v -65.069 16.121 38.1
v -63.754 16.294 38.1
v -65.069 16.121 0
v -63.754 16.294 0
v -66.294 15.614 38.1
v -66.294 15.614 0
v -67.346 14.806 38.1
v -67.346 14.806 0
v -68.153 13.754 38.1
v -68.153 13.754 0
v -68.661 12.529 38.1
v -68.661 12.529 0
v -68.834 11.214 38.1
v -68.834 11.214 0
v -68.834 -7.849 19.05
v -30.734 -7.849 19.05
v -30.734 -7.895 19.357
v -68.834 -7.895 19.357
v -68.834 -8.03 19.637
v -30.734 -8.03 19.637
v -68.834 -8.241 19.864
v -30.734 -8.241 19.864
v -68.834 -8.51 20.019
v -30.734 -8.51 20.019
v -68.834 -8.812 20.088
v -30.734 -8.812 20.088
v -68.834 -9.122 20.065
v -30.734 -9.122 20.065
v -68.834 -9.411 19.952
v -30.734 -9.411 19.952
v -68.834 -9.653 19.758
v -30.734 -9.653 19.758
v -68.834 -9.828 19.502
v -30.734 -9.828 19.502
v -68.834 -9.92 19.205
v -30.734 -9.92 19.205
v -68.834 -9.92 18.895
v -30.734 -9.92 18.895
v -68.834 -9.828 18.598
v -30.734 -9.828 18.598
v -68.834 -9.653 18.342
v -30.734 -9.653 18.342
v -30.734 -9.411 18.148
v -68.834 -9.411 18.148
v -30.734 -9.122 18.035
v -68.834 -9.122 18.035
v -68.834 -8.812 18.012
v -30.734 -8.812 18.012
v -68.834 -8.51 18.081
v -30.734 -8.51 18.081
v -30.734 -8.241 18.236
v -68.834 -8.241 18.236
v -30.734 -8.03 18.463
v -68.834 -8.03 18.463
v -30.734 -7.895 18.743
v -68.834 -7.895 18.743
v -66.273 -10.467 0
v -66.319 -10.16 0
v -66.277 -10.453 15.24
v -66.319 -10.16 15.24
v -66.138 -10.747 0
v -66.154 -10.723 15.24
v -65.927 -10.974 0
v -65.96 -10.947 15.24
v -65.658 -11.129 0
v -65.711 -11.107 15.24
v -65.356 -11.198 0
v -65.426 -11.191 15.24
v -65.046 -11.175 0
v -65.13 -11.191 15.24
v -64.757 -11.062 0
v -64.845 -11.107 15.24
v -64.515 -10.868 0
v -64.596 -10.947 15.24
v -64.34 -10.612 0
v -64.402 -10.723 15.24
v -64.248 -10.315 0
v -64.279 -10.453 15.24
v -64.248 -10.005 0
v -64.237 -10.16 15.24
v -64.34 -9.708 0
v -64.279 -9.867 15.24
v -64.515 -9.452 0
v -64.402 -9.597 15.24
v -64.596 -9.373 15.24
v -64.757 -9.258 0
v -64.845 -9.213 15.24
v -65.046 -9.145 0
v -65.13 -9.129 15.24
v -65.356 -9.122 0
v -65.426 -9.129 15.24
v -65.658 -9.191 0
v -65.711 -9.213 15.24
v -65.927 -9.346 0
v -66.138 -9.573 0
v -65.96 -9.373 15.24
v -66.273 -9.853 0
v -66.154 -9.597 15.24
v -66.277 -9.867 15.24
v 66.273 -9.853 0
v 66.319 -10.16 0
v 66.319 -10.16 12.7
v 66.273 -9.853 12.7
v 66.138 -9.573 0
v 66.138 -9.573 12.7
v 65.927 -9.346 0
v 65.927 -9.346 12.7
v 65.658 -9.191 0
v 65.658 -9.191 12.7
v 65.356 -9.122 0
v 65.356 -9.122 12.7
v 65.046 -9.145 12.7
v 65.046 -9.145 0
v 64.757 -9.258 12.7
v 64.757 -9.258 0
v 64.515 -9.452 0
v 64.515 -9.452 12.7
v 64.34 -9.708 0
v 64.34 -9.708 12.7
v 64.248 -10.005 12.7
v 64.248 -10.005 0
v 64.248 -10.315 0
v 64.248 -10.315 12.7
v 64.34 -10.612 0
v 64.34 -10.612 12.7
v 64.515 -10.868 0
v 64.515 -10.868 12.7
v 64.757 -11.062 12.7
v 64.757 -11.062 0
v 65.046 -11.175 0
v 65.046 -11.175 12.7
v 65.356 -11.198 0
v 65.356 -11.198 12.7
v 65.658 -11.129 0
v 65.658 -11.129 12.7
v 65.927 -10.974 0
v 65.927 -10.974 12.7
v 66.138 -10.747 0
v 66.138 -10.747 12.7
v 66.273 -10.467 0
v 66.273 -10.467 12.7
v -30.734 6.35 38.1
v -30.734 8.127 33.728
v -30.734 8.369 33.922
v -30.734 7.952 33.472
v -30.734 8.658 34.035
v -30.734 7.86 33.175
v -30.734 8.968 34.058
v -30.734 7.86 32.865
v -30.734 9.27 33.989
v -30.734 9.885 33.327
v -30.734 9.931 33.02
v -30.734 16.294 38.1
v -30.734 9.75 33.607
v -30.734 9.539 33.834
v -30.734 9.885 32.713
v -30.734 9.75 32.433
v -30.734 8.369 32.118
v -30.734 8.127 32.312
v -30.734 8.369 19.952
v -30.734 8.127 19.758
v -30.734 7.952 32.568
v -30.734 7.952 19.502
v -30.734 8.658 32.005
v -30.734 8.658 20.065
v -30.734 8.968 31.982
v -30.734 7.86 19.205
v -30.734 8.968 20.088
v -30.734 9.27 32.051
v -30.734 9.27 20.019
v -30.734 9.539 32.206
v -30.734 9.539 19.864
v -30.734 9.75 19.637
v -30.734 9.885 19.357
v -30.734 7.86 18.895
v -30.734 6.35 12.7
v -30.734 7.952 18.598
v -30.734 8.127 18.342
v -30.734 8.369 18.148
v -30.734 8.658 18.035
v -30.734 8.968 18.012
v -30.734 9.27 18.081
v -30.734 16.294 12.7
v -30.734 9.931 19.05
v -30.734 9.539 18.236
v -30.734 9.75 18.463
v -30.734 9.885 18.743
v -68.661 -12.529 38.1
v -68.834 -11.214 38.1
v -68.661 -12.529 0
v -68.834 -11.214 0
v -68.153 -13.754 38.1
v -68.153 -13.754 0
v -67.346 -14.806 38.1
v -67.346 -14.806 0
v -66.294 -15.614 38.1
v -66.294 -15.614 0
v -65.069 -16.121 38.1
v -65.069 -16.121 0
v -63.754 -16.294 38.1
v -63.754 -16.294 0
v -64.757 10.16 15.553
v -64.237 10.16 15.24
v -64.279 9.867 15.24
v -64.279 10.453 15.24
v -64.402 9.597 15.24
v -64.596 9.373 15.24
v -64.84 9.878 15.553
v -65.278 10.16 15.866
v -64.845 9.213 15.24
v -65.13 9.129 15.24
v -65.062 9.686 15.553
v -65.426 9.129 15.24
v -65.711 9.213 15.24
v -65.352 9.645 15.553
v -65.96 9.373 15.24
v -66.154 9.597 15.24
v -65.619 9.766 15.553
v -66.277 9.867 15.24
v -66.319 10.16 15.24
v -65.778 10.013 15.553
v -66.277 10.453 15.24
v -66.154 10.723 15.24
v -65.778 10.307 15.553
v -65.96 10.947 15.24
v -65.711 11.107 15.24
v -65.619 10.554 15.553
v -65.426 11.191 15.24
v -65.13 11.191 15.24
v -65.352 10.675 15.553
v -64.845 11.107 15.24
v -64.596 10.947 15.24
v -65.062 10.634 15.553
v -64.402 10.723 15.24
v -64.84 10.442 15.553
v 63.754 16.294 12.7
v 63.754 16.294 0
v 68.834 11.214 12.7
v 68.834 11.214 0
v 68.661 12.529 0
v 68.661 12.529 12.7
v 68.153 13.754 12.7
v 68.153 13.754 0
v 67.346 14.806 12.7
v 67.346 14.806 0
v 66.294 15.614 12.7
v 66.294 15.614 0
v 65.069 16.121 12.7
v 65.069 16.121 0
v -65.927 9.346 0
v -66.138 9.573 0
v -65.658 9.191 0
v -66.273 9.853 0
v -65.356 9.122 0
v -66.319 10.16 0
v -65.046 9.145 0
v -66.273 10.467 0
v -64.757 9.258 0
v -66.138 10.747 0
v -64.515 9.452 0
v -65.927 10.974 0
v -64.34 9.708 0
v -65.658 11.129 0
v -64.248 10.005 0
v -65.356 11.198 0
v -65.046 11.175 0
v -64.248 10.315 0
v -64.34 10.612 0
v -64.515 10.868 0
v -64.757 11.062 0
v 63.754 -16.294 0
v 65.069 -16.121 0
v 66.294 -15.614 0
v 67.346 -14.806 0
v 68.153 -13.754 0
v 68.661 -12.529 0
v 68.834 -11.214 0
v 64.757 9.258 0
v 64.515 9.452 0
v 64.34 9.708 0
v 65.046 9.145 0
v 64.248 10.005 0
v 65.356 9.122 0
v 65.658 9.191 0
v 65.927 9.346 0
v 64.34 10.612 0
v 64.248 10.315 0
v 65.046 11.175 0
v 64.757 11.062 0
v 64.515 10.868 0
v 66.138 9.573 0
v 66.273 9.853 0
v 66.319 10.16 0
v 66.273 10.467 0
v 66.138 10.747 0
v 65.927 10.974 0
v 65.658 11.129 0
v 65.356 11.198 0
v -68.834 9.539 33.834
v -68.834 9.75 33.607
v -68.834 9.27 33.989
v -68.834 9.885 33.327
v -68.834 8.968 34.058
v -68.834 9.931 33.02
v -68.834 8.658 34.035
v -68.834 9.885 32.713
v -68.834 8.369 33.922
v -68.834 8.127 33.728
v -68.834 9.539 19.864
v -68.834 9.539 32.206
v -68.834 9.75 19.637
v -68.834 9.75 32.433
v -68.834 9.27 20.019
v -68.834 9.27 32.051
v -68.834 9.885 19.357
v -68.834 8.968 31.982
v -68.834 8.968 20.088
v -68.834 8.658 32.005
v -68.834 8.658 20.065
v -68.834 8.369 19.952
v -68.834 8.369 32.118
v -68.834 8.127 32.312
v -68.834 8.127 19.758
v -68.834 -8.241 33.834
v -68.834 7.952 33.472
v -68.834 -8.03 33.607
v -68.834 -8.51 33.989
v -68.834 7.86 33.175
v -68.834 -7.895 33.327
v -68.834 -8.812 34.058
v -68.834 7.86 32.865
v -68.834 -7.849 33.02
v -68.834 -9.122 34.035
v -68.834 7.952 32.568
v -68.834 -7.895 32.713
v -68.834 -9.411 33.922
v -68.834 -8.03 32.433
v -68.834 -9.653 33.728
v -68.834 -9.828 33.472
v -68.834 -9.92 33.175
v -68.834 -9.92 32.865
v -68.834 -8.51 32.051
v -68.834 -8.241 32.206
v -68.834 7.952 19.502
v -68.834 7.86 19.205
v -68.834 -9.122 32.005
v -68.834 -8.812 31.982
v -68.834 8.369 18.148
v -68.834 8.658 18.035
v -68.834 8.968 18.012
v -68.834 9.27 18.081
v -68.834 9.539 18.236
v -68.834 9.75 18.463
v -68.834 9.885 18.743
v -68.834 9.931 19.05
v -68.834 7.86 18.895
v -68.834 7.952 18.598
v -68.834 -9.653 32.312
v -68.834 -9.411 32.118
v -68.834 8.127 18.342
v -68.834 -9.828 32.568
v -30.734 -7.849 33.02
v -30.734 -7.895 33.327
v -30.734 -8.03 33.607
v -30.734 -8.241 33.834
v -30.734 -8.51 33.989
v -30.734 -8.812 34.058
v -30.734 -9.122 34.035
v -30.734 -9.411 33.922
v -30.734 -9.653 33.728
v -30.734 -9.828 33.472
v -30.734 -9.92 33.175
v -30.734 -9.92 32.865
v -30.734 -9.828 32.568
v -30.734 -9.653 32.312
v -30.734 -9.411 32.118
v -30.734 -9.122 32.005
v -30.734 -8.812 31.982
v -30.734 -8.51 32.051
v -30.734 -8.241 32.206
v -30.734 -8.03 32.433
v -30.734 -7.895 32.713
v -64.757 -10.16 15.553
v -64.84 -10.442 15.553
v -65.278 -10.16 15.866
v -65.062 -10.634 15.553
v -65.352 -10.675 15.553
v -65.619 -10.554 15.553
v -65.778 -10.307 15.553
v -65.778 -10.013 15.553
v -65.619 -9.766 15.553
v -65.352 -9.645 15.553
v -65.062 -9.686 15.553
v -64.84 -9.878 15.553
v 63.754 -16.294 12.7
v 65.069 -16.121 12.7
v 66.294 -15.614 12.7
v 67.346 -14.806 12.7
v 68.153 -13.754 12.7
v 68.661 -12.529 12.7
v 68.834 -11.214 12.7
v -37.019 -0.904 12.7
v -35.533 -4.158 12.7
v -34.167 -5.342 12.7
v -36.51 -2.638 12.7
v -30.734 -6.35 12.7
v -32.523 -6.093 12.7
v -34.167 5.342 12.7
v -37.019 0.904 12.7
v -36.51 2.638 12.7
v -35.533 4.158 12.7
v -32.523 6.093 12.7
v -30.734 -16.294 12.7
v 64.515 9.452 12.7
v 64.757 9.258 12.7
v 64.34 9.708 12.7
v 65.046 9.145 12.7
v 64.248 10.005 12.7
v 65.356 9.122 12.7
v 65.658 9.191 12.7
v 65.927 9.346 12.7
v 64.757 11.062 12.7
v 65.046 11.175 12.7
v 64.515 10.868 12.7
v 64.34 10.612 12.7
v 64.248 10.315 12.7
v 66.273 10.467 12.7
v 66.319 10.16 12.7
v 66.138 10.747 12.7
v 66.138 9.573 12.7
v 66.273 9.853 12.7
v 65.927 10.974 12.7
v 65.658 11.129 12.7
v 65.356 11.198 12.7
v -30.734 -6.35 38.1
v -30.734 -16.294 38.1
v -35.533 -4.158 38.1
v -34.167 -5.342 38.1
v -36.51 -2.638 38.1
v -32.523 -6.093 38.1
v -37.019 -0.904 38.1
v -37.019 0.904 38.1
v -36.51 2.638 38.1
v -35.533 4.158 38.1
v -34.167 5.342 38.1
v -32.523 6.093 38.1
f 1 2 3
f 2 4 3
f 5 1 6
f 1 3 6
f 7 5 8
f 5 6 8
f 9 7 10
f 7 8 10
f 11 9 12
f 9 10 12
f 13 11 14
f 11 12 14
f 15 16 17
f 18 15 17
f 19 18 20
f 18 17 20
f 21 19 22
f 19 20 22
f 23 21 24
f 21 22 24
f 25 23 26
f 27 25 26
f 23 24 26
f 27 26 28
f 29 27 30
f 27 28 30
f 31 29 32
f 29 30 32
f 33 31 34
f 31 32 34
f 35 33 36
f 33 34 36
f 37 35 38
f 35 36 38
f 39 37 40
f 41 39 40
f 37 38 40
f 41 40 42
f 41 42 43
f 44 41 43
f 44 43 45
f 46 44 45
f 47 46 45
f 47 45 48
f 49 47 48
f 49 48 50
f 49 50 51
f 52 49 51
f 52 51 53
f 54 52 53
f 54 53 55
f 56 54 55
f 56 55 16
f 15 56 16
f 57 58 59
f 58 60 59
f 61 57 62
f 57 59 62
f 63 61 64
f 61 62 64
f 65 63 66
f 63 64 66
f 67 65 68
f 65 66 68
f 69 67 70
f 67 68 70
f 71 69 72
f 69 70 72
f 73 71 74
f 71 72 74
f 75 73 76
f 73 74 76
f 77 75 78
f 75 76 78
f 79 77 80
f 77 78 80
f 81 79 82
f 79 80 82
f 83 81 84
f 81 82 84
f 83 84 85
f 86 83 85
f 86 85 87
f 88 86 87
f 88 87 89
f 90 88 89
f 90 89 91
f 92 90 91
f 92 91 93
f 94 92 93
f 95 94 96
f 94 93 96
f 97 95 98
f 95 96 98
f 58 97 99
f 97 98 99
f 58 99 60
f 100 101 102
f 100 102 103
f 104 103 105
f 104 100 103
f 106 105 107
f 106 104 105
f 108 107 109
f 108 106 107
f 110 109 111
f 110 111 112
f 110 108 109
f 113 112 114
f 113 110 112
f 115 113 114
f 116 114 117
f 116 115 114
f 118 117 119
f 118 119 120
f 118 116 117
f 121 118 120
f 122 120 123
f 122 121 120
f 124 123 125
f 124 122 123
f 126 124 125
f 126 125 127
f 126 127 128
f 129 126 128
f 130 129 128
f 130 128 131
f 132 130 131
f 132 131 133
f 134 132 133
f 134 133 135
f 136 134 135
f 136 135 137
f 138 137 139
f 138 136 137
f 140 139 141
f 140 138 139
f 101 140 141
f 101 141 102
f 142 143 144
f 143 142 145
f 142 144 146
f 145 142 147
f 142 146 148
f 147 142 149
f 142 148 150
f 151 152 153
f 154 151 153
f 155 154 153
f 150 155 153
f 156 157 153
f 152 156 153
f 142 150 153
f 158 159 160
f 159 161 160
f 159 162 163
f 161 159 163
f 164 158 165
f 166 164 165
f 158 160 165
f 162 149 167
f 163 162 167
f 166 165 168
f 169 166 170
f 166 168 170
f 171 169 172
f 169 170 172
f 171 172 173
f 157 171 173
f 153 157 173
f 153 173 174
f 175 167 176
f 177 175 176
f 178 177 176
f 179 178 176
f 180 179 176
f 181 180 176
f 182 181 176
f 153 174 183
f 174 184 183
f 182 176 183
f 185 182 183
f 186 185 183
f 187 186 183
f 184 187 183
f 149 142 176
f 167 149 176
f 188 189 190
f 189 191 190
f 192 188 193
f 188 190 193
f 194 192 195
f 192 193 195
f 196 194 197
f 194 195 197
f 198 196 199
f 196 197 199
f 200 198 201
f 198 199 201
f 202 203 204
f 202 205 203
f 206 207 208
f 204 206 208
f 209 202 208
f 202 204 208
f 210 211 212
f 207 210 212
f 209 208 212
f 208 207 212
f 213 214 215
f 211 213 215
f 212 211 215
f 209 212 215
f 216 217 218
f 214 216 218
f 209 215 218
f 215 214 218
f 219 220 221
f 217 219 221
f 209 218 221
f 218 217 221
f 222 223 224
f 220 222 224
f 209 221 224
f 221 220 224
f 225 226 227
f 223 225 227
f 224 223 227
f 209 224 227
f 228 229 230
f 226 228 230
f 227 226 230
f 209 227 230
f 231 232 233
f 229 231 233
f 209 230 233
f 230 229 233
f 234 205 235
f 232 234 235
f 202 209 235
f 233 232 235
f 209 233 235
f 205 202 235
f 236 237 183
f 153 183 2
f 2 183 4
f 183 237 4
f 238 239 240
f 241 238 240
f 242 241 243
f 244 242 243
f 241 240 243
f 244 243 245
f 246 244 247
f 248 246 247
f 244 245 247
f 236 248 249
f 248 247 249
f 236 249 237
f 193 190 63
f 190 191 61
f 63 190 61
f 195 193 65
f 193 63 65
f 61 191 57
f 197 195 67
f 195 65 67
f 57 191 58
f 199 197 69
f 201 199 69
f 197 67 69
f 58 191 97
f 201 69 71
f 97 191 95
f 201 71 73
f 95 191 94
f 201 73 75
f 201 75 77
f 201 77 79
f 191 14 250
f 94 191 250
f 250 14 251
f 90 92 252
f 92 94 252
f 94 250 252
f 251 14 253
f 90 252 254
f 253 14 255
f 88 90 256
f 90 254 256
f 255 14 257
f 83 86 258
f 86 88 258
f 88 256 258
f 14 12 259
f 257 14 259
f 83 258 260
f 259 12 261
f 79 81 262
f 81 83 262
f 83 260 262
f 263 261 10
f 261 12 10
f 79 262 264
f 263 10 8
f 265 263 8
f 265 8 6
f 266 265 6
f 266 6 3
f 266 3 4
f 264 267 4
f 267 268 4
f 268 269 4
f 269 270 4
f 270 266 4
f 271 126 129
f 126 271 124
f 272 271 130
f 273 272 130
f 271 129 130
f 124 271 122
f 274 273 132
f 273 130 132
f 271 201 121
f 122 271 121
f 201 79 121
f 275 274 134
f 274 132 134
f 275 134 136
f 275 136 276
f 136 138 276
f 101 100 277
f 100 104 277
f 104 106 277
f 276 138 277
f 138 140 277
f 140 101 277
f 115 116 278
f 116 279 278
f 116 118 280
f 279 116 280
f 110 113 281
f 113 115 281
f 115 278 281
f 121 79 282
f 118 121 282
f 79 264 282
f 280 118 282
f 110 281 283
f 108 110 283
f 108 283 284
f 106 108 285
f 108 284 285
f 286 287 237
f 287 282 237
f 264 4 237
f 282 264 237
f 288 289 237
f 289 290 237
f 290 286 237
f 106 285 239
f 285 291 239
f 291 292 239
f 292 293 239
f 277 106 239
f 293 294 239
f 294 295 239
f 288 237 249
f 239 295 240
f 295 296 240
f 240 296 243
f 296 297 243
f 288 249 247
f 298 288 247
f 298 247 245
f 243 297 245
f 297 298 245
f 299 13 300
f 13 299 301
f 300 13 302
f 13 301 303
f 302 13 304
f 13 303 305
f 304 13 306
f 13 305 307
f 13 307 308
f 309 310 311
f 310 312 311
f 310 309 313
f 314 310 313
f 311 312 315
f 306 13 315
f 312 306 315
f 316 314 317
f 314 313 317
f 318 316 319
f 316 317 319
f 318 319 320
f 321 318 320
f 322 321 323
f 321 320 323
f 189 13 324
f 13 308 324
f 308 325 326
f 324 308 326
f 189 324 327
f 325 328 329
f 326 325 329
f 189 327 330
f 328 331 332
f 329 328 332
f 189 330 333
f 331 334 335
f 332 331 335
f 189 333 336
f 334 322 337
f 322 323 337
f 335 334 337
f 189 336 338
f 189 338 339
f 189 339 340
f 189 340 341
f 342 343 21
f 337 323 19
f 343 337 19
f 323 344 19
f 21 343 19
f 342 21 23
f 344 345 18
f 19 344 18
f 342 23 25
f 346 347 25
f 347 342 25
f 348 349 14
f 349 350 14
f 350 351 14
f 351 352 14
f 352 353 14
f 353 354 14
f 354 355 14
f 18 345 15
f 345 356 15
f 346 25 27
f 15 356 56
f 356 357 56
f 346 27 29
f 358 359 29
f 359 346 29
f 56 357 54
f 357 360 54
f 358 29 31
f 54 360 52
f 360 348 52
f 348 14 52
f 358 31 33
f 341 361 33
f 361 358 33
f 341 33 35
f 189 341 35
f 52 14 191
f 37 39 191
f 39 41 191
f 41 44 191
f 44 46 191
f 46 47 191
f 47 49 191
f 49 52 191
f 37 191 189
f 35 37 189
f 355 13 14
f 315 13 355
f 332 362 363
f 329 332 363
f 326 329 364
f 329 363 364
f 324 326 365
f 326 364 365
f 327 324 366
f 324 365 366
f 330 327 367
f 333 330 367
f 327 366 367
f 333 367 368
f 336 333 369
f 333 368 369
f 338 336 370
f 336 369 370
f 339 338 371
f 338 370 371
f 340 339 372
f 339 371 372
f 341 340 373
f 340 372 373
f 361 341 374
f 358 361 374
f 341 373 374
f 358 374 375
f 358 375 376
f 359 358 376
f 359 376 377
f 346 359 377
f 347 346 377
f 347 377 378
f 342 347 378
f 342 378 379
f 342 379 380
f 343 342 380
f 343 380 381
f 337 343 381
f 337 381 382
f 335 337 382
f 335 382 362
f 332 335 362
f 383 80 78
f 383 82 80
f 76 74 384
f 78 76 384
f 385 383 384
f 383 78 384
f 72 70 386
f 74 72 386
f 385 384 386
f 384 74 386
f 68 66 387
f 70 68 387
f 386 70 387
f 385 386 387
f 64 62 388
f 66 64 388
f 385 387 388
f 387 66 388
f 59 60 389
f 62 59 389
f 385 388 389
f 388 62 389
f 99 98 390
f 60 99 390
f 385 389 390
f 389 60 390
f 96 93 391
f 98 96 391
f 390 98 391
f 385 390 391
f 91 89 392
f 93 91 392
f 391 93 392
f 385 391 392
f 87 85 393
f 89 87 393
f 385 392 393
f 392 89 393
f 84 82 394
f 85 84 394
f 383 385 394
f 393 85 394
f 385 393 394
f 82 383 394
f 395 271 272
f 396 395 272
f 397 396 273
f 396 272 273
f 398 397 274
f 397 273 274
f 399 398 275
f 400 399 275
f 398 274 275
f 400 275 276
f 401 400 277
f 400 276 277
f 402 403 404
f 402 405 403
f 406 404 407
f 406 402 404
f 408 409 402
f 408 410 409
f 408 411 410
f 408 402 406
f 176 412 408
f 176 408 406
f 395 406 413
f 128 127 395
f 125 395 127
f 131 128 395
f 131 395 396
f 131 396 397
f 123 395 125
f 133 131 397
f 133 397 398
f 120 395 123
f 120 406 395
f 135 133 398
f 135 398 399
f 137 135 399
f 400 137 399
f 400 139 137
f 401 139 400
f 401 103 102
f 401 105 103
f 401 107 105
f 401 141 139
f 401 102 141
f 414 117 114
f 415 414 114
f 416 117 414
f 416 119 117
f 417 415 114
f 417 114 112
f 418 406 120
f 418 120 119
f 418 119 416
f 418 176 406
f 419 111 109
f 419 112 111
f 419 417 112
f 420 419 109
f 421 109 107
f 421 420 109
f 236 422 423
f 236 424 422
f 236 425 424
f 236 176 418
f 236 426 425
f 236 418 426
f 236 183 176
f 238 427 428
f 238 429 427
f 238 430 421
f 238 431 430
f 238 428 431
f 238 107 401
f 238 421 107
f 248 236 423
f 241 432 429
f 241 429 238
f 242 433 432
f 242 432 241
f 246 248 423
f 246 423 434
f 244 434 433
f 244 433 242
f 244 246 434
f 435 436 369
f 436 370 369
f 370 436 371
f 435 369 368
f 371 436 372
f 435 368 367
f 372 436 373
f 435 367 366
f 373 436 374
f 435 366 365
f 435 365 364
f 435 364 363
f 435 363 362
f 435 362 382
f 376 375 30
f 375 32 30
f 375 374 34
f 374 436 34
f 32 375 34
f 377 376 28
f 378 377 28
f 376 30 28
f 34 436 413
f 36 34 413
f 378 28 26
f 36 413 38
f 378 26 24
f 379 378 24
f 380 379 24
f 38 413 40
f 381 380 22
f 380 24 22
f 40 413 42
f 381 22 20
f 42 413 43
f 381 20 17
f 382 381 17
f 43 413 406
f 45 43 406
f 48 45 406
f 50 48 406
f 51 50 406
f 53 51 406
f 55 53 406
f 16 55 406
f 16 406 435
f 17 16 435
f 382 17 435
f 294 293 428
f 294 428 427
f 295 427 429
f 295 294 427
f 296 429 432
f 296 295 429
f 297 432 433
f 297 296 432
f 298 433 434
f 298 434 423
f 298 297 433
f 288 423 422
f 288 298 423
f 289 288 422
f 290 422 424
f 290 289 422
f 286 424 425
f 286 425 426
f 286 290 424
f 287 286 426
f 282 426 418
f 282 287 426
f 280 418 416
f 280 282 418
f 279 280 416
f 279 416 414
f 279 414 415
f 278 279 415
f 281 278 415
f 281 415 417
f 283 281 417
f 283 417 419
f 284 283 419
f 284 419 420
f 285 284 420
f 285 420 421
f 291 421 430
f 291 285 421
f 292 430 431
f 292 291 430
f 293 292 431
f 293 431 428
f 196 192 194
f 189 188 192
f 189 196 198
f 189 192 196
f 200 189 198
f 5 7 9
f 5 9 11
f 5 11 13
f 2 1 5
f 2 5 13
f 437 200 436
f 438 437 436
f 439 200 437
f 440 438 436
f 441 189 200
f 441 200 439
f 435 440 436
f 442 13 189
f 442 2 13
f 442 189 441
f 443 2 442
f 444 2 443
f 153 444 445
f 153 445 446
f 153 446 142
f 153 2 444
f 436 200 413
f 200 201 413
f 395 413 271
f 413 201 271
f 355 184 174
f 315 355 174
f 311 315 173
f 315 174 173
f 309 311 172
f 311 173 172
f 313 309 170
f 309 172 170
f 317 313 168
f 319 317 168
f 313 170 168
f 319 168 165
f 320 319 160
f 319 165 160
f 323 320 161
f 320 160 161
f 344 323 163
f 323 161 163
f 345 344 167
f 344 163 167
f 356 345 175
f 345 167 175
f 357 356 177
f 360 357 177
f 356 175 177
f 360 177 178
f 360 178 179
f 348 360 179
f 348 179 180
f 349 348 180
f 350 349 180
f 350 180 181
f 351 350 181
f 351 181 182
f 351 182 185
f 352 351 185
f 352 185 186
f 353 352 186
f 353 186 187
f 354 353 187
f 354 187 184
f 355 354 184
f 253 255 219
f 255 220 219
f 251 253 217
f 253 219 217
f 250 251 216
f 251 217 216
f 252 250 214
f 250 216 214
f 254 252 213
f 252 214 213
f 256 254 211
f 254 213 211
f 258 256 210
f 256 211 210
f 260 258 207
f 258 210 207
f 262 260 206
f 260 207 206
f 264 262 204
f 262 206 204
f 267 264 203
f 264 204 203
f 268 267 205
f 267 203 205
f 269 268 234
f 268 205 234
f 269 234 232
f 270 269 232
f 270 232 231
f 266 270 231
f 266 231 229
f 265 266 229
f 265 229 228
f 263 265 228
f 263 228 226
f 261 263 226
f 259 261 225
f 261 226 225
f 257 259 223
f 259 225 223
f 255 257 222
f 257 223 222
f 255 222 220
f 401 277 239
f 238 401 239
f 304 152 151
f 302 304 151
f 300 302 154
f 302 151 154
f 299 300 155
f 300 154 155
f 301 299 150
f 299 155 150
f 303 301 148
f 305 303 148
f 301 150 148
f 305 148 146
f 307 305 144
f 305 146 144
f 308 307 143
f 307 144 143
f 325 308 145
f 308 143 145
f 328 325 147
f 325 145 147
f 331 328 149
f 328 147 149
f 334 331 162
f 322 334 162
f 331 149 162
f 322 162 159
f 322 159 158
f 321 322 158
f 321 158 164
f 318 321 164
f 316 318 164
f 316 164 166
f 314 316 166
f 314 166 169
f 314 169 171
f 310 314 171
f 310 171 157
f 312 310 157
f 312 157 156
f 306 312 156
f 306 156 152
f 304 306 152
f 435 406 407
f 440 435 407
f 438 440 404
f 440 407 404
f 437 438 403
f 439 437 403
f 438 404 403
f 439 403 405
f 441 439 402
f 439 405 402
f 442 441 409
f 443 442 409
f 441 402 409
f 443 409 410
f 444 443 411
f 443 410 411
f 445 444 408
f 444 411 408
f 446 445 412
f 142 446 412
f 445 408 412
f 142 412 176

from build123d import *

# Parameters (mm, degrees)
F0_R     = 1.0414
F1_DEPTH = 12.7
F3_DEPTH = 25.4
F5_D     = 2.0828
F7_D     = 2.0828
F7_DEPTH = 15.24
F7_TIP   = 0.6257362487


with BuildPart() as f1:
    # F0 (on Top) → F1 (new body)
    with BuildSketch(Plane.XY):
        with BuildLine():
            ThreePointArc((-68.834, -11.2141), (-67.3461024484, -14.8062024484), (-63.754, -16.2941))
            Line((-63.754, -16.2941), (63.754, -16.2941))
            ThreePointArc((63.754, -16.2941), (67.3461024484, -14.8062024484), (68.834, -11.2141))
            Line((68.834, -11.2141), (68.834, 11.2141))
            ThreePointArc((68.834, 11.2141), (67.3461024484, 14.8062024484), (63.754, 16.2941))
            Line((63.754, 16.2941), (-63.754, 16.2941))
            ThreePointArc((-63.754, 16.2941), (-67.3461024484, 14.8062024484), (-68.834, 11.2141))
            Line((-68.834, 11.2141), (-68.834, -11.2141))
        make_face()
        with Locations((65.278, -10.16)):
            Circle(F0_R, mode=Mode.SUBTRACT)
        with Locations((65.278, 10.16)):
            Circle(F0_R, mode=Mode.SUBTRACT)
    extrude(amount=F1_DEPTH)

    # F2 (on face) → F3 (join)
    with BuildSketch(Plane.XY.offset(12.7)):
        with BuildLine():
            Line((-30.734, 16.2941), (-63.754, 16.2941))
            ThreePointArc((-63.754, 16.2941), (-67.3461024484, 14.8062024484), (-68.834, 11.2141))
            Line((-68.834, 11.2141), (-68.834, -11.2141))
            ThreePointArc((-68.834, -11.2141), (-67.3461024484, -14.8062024484), (-63.754, -16.2941))
            Line((-63.754, -16.2941), (-30.734, -16.2941))
            Line((-30.734, -16.2941), (-30.734, -6.35))
            ThreePointArc((-30.734, -6.35), (-37.084, 0), (-30.734, 6.35))
            Line((-30.734, 6.35), (-30.734, 16.2941))
        make_face()
    extrude(amount=F3_DEPTH)

    # F5 (through all)
    with Locations(Plane(origin=(-68.834, 0, 0), x_dir=(0, -1, 0), z_dir=(-1, 0, 0))):
        with Locations((-8.89, 33.02), (-8.89, 19.05), (8.89, 33.02), (8.89, 19.05)):
            Hole(F5_D / 2)

    # F7
    with Locations(Plane(origin=(0, 0, 0), x_dir=(1, 0, 0), z_dir=(0, 0, -1))):
        with Locations((-65.278, 10.16), (-65.278, -10.16)):
            Hole(F7_D / 2, depth=F7_DEPTH)
            with Locations((0, 0, -(F7_DEPTH + F7_TIP / 2))):  # 118° drill point
                Cone(0, F7_D / 2, F7_TIP, mode=Mode.SUBTRACT)


solid = f1.part
